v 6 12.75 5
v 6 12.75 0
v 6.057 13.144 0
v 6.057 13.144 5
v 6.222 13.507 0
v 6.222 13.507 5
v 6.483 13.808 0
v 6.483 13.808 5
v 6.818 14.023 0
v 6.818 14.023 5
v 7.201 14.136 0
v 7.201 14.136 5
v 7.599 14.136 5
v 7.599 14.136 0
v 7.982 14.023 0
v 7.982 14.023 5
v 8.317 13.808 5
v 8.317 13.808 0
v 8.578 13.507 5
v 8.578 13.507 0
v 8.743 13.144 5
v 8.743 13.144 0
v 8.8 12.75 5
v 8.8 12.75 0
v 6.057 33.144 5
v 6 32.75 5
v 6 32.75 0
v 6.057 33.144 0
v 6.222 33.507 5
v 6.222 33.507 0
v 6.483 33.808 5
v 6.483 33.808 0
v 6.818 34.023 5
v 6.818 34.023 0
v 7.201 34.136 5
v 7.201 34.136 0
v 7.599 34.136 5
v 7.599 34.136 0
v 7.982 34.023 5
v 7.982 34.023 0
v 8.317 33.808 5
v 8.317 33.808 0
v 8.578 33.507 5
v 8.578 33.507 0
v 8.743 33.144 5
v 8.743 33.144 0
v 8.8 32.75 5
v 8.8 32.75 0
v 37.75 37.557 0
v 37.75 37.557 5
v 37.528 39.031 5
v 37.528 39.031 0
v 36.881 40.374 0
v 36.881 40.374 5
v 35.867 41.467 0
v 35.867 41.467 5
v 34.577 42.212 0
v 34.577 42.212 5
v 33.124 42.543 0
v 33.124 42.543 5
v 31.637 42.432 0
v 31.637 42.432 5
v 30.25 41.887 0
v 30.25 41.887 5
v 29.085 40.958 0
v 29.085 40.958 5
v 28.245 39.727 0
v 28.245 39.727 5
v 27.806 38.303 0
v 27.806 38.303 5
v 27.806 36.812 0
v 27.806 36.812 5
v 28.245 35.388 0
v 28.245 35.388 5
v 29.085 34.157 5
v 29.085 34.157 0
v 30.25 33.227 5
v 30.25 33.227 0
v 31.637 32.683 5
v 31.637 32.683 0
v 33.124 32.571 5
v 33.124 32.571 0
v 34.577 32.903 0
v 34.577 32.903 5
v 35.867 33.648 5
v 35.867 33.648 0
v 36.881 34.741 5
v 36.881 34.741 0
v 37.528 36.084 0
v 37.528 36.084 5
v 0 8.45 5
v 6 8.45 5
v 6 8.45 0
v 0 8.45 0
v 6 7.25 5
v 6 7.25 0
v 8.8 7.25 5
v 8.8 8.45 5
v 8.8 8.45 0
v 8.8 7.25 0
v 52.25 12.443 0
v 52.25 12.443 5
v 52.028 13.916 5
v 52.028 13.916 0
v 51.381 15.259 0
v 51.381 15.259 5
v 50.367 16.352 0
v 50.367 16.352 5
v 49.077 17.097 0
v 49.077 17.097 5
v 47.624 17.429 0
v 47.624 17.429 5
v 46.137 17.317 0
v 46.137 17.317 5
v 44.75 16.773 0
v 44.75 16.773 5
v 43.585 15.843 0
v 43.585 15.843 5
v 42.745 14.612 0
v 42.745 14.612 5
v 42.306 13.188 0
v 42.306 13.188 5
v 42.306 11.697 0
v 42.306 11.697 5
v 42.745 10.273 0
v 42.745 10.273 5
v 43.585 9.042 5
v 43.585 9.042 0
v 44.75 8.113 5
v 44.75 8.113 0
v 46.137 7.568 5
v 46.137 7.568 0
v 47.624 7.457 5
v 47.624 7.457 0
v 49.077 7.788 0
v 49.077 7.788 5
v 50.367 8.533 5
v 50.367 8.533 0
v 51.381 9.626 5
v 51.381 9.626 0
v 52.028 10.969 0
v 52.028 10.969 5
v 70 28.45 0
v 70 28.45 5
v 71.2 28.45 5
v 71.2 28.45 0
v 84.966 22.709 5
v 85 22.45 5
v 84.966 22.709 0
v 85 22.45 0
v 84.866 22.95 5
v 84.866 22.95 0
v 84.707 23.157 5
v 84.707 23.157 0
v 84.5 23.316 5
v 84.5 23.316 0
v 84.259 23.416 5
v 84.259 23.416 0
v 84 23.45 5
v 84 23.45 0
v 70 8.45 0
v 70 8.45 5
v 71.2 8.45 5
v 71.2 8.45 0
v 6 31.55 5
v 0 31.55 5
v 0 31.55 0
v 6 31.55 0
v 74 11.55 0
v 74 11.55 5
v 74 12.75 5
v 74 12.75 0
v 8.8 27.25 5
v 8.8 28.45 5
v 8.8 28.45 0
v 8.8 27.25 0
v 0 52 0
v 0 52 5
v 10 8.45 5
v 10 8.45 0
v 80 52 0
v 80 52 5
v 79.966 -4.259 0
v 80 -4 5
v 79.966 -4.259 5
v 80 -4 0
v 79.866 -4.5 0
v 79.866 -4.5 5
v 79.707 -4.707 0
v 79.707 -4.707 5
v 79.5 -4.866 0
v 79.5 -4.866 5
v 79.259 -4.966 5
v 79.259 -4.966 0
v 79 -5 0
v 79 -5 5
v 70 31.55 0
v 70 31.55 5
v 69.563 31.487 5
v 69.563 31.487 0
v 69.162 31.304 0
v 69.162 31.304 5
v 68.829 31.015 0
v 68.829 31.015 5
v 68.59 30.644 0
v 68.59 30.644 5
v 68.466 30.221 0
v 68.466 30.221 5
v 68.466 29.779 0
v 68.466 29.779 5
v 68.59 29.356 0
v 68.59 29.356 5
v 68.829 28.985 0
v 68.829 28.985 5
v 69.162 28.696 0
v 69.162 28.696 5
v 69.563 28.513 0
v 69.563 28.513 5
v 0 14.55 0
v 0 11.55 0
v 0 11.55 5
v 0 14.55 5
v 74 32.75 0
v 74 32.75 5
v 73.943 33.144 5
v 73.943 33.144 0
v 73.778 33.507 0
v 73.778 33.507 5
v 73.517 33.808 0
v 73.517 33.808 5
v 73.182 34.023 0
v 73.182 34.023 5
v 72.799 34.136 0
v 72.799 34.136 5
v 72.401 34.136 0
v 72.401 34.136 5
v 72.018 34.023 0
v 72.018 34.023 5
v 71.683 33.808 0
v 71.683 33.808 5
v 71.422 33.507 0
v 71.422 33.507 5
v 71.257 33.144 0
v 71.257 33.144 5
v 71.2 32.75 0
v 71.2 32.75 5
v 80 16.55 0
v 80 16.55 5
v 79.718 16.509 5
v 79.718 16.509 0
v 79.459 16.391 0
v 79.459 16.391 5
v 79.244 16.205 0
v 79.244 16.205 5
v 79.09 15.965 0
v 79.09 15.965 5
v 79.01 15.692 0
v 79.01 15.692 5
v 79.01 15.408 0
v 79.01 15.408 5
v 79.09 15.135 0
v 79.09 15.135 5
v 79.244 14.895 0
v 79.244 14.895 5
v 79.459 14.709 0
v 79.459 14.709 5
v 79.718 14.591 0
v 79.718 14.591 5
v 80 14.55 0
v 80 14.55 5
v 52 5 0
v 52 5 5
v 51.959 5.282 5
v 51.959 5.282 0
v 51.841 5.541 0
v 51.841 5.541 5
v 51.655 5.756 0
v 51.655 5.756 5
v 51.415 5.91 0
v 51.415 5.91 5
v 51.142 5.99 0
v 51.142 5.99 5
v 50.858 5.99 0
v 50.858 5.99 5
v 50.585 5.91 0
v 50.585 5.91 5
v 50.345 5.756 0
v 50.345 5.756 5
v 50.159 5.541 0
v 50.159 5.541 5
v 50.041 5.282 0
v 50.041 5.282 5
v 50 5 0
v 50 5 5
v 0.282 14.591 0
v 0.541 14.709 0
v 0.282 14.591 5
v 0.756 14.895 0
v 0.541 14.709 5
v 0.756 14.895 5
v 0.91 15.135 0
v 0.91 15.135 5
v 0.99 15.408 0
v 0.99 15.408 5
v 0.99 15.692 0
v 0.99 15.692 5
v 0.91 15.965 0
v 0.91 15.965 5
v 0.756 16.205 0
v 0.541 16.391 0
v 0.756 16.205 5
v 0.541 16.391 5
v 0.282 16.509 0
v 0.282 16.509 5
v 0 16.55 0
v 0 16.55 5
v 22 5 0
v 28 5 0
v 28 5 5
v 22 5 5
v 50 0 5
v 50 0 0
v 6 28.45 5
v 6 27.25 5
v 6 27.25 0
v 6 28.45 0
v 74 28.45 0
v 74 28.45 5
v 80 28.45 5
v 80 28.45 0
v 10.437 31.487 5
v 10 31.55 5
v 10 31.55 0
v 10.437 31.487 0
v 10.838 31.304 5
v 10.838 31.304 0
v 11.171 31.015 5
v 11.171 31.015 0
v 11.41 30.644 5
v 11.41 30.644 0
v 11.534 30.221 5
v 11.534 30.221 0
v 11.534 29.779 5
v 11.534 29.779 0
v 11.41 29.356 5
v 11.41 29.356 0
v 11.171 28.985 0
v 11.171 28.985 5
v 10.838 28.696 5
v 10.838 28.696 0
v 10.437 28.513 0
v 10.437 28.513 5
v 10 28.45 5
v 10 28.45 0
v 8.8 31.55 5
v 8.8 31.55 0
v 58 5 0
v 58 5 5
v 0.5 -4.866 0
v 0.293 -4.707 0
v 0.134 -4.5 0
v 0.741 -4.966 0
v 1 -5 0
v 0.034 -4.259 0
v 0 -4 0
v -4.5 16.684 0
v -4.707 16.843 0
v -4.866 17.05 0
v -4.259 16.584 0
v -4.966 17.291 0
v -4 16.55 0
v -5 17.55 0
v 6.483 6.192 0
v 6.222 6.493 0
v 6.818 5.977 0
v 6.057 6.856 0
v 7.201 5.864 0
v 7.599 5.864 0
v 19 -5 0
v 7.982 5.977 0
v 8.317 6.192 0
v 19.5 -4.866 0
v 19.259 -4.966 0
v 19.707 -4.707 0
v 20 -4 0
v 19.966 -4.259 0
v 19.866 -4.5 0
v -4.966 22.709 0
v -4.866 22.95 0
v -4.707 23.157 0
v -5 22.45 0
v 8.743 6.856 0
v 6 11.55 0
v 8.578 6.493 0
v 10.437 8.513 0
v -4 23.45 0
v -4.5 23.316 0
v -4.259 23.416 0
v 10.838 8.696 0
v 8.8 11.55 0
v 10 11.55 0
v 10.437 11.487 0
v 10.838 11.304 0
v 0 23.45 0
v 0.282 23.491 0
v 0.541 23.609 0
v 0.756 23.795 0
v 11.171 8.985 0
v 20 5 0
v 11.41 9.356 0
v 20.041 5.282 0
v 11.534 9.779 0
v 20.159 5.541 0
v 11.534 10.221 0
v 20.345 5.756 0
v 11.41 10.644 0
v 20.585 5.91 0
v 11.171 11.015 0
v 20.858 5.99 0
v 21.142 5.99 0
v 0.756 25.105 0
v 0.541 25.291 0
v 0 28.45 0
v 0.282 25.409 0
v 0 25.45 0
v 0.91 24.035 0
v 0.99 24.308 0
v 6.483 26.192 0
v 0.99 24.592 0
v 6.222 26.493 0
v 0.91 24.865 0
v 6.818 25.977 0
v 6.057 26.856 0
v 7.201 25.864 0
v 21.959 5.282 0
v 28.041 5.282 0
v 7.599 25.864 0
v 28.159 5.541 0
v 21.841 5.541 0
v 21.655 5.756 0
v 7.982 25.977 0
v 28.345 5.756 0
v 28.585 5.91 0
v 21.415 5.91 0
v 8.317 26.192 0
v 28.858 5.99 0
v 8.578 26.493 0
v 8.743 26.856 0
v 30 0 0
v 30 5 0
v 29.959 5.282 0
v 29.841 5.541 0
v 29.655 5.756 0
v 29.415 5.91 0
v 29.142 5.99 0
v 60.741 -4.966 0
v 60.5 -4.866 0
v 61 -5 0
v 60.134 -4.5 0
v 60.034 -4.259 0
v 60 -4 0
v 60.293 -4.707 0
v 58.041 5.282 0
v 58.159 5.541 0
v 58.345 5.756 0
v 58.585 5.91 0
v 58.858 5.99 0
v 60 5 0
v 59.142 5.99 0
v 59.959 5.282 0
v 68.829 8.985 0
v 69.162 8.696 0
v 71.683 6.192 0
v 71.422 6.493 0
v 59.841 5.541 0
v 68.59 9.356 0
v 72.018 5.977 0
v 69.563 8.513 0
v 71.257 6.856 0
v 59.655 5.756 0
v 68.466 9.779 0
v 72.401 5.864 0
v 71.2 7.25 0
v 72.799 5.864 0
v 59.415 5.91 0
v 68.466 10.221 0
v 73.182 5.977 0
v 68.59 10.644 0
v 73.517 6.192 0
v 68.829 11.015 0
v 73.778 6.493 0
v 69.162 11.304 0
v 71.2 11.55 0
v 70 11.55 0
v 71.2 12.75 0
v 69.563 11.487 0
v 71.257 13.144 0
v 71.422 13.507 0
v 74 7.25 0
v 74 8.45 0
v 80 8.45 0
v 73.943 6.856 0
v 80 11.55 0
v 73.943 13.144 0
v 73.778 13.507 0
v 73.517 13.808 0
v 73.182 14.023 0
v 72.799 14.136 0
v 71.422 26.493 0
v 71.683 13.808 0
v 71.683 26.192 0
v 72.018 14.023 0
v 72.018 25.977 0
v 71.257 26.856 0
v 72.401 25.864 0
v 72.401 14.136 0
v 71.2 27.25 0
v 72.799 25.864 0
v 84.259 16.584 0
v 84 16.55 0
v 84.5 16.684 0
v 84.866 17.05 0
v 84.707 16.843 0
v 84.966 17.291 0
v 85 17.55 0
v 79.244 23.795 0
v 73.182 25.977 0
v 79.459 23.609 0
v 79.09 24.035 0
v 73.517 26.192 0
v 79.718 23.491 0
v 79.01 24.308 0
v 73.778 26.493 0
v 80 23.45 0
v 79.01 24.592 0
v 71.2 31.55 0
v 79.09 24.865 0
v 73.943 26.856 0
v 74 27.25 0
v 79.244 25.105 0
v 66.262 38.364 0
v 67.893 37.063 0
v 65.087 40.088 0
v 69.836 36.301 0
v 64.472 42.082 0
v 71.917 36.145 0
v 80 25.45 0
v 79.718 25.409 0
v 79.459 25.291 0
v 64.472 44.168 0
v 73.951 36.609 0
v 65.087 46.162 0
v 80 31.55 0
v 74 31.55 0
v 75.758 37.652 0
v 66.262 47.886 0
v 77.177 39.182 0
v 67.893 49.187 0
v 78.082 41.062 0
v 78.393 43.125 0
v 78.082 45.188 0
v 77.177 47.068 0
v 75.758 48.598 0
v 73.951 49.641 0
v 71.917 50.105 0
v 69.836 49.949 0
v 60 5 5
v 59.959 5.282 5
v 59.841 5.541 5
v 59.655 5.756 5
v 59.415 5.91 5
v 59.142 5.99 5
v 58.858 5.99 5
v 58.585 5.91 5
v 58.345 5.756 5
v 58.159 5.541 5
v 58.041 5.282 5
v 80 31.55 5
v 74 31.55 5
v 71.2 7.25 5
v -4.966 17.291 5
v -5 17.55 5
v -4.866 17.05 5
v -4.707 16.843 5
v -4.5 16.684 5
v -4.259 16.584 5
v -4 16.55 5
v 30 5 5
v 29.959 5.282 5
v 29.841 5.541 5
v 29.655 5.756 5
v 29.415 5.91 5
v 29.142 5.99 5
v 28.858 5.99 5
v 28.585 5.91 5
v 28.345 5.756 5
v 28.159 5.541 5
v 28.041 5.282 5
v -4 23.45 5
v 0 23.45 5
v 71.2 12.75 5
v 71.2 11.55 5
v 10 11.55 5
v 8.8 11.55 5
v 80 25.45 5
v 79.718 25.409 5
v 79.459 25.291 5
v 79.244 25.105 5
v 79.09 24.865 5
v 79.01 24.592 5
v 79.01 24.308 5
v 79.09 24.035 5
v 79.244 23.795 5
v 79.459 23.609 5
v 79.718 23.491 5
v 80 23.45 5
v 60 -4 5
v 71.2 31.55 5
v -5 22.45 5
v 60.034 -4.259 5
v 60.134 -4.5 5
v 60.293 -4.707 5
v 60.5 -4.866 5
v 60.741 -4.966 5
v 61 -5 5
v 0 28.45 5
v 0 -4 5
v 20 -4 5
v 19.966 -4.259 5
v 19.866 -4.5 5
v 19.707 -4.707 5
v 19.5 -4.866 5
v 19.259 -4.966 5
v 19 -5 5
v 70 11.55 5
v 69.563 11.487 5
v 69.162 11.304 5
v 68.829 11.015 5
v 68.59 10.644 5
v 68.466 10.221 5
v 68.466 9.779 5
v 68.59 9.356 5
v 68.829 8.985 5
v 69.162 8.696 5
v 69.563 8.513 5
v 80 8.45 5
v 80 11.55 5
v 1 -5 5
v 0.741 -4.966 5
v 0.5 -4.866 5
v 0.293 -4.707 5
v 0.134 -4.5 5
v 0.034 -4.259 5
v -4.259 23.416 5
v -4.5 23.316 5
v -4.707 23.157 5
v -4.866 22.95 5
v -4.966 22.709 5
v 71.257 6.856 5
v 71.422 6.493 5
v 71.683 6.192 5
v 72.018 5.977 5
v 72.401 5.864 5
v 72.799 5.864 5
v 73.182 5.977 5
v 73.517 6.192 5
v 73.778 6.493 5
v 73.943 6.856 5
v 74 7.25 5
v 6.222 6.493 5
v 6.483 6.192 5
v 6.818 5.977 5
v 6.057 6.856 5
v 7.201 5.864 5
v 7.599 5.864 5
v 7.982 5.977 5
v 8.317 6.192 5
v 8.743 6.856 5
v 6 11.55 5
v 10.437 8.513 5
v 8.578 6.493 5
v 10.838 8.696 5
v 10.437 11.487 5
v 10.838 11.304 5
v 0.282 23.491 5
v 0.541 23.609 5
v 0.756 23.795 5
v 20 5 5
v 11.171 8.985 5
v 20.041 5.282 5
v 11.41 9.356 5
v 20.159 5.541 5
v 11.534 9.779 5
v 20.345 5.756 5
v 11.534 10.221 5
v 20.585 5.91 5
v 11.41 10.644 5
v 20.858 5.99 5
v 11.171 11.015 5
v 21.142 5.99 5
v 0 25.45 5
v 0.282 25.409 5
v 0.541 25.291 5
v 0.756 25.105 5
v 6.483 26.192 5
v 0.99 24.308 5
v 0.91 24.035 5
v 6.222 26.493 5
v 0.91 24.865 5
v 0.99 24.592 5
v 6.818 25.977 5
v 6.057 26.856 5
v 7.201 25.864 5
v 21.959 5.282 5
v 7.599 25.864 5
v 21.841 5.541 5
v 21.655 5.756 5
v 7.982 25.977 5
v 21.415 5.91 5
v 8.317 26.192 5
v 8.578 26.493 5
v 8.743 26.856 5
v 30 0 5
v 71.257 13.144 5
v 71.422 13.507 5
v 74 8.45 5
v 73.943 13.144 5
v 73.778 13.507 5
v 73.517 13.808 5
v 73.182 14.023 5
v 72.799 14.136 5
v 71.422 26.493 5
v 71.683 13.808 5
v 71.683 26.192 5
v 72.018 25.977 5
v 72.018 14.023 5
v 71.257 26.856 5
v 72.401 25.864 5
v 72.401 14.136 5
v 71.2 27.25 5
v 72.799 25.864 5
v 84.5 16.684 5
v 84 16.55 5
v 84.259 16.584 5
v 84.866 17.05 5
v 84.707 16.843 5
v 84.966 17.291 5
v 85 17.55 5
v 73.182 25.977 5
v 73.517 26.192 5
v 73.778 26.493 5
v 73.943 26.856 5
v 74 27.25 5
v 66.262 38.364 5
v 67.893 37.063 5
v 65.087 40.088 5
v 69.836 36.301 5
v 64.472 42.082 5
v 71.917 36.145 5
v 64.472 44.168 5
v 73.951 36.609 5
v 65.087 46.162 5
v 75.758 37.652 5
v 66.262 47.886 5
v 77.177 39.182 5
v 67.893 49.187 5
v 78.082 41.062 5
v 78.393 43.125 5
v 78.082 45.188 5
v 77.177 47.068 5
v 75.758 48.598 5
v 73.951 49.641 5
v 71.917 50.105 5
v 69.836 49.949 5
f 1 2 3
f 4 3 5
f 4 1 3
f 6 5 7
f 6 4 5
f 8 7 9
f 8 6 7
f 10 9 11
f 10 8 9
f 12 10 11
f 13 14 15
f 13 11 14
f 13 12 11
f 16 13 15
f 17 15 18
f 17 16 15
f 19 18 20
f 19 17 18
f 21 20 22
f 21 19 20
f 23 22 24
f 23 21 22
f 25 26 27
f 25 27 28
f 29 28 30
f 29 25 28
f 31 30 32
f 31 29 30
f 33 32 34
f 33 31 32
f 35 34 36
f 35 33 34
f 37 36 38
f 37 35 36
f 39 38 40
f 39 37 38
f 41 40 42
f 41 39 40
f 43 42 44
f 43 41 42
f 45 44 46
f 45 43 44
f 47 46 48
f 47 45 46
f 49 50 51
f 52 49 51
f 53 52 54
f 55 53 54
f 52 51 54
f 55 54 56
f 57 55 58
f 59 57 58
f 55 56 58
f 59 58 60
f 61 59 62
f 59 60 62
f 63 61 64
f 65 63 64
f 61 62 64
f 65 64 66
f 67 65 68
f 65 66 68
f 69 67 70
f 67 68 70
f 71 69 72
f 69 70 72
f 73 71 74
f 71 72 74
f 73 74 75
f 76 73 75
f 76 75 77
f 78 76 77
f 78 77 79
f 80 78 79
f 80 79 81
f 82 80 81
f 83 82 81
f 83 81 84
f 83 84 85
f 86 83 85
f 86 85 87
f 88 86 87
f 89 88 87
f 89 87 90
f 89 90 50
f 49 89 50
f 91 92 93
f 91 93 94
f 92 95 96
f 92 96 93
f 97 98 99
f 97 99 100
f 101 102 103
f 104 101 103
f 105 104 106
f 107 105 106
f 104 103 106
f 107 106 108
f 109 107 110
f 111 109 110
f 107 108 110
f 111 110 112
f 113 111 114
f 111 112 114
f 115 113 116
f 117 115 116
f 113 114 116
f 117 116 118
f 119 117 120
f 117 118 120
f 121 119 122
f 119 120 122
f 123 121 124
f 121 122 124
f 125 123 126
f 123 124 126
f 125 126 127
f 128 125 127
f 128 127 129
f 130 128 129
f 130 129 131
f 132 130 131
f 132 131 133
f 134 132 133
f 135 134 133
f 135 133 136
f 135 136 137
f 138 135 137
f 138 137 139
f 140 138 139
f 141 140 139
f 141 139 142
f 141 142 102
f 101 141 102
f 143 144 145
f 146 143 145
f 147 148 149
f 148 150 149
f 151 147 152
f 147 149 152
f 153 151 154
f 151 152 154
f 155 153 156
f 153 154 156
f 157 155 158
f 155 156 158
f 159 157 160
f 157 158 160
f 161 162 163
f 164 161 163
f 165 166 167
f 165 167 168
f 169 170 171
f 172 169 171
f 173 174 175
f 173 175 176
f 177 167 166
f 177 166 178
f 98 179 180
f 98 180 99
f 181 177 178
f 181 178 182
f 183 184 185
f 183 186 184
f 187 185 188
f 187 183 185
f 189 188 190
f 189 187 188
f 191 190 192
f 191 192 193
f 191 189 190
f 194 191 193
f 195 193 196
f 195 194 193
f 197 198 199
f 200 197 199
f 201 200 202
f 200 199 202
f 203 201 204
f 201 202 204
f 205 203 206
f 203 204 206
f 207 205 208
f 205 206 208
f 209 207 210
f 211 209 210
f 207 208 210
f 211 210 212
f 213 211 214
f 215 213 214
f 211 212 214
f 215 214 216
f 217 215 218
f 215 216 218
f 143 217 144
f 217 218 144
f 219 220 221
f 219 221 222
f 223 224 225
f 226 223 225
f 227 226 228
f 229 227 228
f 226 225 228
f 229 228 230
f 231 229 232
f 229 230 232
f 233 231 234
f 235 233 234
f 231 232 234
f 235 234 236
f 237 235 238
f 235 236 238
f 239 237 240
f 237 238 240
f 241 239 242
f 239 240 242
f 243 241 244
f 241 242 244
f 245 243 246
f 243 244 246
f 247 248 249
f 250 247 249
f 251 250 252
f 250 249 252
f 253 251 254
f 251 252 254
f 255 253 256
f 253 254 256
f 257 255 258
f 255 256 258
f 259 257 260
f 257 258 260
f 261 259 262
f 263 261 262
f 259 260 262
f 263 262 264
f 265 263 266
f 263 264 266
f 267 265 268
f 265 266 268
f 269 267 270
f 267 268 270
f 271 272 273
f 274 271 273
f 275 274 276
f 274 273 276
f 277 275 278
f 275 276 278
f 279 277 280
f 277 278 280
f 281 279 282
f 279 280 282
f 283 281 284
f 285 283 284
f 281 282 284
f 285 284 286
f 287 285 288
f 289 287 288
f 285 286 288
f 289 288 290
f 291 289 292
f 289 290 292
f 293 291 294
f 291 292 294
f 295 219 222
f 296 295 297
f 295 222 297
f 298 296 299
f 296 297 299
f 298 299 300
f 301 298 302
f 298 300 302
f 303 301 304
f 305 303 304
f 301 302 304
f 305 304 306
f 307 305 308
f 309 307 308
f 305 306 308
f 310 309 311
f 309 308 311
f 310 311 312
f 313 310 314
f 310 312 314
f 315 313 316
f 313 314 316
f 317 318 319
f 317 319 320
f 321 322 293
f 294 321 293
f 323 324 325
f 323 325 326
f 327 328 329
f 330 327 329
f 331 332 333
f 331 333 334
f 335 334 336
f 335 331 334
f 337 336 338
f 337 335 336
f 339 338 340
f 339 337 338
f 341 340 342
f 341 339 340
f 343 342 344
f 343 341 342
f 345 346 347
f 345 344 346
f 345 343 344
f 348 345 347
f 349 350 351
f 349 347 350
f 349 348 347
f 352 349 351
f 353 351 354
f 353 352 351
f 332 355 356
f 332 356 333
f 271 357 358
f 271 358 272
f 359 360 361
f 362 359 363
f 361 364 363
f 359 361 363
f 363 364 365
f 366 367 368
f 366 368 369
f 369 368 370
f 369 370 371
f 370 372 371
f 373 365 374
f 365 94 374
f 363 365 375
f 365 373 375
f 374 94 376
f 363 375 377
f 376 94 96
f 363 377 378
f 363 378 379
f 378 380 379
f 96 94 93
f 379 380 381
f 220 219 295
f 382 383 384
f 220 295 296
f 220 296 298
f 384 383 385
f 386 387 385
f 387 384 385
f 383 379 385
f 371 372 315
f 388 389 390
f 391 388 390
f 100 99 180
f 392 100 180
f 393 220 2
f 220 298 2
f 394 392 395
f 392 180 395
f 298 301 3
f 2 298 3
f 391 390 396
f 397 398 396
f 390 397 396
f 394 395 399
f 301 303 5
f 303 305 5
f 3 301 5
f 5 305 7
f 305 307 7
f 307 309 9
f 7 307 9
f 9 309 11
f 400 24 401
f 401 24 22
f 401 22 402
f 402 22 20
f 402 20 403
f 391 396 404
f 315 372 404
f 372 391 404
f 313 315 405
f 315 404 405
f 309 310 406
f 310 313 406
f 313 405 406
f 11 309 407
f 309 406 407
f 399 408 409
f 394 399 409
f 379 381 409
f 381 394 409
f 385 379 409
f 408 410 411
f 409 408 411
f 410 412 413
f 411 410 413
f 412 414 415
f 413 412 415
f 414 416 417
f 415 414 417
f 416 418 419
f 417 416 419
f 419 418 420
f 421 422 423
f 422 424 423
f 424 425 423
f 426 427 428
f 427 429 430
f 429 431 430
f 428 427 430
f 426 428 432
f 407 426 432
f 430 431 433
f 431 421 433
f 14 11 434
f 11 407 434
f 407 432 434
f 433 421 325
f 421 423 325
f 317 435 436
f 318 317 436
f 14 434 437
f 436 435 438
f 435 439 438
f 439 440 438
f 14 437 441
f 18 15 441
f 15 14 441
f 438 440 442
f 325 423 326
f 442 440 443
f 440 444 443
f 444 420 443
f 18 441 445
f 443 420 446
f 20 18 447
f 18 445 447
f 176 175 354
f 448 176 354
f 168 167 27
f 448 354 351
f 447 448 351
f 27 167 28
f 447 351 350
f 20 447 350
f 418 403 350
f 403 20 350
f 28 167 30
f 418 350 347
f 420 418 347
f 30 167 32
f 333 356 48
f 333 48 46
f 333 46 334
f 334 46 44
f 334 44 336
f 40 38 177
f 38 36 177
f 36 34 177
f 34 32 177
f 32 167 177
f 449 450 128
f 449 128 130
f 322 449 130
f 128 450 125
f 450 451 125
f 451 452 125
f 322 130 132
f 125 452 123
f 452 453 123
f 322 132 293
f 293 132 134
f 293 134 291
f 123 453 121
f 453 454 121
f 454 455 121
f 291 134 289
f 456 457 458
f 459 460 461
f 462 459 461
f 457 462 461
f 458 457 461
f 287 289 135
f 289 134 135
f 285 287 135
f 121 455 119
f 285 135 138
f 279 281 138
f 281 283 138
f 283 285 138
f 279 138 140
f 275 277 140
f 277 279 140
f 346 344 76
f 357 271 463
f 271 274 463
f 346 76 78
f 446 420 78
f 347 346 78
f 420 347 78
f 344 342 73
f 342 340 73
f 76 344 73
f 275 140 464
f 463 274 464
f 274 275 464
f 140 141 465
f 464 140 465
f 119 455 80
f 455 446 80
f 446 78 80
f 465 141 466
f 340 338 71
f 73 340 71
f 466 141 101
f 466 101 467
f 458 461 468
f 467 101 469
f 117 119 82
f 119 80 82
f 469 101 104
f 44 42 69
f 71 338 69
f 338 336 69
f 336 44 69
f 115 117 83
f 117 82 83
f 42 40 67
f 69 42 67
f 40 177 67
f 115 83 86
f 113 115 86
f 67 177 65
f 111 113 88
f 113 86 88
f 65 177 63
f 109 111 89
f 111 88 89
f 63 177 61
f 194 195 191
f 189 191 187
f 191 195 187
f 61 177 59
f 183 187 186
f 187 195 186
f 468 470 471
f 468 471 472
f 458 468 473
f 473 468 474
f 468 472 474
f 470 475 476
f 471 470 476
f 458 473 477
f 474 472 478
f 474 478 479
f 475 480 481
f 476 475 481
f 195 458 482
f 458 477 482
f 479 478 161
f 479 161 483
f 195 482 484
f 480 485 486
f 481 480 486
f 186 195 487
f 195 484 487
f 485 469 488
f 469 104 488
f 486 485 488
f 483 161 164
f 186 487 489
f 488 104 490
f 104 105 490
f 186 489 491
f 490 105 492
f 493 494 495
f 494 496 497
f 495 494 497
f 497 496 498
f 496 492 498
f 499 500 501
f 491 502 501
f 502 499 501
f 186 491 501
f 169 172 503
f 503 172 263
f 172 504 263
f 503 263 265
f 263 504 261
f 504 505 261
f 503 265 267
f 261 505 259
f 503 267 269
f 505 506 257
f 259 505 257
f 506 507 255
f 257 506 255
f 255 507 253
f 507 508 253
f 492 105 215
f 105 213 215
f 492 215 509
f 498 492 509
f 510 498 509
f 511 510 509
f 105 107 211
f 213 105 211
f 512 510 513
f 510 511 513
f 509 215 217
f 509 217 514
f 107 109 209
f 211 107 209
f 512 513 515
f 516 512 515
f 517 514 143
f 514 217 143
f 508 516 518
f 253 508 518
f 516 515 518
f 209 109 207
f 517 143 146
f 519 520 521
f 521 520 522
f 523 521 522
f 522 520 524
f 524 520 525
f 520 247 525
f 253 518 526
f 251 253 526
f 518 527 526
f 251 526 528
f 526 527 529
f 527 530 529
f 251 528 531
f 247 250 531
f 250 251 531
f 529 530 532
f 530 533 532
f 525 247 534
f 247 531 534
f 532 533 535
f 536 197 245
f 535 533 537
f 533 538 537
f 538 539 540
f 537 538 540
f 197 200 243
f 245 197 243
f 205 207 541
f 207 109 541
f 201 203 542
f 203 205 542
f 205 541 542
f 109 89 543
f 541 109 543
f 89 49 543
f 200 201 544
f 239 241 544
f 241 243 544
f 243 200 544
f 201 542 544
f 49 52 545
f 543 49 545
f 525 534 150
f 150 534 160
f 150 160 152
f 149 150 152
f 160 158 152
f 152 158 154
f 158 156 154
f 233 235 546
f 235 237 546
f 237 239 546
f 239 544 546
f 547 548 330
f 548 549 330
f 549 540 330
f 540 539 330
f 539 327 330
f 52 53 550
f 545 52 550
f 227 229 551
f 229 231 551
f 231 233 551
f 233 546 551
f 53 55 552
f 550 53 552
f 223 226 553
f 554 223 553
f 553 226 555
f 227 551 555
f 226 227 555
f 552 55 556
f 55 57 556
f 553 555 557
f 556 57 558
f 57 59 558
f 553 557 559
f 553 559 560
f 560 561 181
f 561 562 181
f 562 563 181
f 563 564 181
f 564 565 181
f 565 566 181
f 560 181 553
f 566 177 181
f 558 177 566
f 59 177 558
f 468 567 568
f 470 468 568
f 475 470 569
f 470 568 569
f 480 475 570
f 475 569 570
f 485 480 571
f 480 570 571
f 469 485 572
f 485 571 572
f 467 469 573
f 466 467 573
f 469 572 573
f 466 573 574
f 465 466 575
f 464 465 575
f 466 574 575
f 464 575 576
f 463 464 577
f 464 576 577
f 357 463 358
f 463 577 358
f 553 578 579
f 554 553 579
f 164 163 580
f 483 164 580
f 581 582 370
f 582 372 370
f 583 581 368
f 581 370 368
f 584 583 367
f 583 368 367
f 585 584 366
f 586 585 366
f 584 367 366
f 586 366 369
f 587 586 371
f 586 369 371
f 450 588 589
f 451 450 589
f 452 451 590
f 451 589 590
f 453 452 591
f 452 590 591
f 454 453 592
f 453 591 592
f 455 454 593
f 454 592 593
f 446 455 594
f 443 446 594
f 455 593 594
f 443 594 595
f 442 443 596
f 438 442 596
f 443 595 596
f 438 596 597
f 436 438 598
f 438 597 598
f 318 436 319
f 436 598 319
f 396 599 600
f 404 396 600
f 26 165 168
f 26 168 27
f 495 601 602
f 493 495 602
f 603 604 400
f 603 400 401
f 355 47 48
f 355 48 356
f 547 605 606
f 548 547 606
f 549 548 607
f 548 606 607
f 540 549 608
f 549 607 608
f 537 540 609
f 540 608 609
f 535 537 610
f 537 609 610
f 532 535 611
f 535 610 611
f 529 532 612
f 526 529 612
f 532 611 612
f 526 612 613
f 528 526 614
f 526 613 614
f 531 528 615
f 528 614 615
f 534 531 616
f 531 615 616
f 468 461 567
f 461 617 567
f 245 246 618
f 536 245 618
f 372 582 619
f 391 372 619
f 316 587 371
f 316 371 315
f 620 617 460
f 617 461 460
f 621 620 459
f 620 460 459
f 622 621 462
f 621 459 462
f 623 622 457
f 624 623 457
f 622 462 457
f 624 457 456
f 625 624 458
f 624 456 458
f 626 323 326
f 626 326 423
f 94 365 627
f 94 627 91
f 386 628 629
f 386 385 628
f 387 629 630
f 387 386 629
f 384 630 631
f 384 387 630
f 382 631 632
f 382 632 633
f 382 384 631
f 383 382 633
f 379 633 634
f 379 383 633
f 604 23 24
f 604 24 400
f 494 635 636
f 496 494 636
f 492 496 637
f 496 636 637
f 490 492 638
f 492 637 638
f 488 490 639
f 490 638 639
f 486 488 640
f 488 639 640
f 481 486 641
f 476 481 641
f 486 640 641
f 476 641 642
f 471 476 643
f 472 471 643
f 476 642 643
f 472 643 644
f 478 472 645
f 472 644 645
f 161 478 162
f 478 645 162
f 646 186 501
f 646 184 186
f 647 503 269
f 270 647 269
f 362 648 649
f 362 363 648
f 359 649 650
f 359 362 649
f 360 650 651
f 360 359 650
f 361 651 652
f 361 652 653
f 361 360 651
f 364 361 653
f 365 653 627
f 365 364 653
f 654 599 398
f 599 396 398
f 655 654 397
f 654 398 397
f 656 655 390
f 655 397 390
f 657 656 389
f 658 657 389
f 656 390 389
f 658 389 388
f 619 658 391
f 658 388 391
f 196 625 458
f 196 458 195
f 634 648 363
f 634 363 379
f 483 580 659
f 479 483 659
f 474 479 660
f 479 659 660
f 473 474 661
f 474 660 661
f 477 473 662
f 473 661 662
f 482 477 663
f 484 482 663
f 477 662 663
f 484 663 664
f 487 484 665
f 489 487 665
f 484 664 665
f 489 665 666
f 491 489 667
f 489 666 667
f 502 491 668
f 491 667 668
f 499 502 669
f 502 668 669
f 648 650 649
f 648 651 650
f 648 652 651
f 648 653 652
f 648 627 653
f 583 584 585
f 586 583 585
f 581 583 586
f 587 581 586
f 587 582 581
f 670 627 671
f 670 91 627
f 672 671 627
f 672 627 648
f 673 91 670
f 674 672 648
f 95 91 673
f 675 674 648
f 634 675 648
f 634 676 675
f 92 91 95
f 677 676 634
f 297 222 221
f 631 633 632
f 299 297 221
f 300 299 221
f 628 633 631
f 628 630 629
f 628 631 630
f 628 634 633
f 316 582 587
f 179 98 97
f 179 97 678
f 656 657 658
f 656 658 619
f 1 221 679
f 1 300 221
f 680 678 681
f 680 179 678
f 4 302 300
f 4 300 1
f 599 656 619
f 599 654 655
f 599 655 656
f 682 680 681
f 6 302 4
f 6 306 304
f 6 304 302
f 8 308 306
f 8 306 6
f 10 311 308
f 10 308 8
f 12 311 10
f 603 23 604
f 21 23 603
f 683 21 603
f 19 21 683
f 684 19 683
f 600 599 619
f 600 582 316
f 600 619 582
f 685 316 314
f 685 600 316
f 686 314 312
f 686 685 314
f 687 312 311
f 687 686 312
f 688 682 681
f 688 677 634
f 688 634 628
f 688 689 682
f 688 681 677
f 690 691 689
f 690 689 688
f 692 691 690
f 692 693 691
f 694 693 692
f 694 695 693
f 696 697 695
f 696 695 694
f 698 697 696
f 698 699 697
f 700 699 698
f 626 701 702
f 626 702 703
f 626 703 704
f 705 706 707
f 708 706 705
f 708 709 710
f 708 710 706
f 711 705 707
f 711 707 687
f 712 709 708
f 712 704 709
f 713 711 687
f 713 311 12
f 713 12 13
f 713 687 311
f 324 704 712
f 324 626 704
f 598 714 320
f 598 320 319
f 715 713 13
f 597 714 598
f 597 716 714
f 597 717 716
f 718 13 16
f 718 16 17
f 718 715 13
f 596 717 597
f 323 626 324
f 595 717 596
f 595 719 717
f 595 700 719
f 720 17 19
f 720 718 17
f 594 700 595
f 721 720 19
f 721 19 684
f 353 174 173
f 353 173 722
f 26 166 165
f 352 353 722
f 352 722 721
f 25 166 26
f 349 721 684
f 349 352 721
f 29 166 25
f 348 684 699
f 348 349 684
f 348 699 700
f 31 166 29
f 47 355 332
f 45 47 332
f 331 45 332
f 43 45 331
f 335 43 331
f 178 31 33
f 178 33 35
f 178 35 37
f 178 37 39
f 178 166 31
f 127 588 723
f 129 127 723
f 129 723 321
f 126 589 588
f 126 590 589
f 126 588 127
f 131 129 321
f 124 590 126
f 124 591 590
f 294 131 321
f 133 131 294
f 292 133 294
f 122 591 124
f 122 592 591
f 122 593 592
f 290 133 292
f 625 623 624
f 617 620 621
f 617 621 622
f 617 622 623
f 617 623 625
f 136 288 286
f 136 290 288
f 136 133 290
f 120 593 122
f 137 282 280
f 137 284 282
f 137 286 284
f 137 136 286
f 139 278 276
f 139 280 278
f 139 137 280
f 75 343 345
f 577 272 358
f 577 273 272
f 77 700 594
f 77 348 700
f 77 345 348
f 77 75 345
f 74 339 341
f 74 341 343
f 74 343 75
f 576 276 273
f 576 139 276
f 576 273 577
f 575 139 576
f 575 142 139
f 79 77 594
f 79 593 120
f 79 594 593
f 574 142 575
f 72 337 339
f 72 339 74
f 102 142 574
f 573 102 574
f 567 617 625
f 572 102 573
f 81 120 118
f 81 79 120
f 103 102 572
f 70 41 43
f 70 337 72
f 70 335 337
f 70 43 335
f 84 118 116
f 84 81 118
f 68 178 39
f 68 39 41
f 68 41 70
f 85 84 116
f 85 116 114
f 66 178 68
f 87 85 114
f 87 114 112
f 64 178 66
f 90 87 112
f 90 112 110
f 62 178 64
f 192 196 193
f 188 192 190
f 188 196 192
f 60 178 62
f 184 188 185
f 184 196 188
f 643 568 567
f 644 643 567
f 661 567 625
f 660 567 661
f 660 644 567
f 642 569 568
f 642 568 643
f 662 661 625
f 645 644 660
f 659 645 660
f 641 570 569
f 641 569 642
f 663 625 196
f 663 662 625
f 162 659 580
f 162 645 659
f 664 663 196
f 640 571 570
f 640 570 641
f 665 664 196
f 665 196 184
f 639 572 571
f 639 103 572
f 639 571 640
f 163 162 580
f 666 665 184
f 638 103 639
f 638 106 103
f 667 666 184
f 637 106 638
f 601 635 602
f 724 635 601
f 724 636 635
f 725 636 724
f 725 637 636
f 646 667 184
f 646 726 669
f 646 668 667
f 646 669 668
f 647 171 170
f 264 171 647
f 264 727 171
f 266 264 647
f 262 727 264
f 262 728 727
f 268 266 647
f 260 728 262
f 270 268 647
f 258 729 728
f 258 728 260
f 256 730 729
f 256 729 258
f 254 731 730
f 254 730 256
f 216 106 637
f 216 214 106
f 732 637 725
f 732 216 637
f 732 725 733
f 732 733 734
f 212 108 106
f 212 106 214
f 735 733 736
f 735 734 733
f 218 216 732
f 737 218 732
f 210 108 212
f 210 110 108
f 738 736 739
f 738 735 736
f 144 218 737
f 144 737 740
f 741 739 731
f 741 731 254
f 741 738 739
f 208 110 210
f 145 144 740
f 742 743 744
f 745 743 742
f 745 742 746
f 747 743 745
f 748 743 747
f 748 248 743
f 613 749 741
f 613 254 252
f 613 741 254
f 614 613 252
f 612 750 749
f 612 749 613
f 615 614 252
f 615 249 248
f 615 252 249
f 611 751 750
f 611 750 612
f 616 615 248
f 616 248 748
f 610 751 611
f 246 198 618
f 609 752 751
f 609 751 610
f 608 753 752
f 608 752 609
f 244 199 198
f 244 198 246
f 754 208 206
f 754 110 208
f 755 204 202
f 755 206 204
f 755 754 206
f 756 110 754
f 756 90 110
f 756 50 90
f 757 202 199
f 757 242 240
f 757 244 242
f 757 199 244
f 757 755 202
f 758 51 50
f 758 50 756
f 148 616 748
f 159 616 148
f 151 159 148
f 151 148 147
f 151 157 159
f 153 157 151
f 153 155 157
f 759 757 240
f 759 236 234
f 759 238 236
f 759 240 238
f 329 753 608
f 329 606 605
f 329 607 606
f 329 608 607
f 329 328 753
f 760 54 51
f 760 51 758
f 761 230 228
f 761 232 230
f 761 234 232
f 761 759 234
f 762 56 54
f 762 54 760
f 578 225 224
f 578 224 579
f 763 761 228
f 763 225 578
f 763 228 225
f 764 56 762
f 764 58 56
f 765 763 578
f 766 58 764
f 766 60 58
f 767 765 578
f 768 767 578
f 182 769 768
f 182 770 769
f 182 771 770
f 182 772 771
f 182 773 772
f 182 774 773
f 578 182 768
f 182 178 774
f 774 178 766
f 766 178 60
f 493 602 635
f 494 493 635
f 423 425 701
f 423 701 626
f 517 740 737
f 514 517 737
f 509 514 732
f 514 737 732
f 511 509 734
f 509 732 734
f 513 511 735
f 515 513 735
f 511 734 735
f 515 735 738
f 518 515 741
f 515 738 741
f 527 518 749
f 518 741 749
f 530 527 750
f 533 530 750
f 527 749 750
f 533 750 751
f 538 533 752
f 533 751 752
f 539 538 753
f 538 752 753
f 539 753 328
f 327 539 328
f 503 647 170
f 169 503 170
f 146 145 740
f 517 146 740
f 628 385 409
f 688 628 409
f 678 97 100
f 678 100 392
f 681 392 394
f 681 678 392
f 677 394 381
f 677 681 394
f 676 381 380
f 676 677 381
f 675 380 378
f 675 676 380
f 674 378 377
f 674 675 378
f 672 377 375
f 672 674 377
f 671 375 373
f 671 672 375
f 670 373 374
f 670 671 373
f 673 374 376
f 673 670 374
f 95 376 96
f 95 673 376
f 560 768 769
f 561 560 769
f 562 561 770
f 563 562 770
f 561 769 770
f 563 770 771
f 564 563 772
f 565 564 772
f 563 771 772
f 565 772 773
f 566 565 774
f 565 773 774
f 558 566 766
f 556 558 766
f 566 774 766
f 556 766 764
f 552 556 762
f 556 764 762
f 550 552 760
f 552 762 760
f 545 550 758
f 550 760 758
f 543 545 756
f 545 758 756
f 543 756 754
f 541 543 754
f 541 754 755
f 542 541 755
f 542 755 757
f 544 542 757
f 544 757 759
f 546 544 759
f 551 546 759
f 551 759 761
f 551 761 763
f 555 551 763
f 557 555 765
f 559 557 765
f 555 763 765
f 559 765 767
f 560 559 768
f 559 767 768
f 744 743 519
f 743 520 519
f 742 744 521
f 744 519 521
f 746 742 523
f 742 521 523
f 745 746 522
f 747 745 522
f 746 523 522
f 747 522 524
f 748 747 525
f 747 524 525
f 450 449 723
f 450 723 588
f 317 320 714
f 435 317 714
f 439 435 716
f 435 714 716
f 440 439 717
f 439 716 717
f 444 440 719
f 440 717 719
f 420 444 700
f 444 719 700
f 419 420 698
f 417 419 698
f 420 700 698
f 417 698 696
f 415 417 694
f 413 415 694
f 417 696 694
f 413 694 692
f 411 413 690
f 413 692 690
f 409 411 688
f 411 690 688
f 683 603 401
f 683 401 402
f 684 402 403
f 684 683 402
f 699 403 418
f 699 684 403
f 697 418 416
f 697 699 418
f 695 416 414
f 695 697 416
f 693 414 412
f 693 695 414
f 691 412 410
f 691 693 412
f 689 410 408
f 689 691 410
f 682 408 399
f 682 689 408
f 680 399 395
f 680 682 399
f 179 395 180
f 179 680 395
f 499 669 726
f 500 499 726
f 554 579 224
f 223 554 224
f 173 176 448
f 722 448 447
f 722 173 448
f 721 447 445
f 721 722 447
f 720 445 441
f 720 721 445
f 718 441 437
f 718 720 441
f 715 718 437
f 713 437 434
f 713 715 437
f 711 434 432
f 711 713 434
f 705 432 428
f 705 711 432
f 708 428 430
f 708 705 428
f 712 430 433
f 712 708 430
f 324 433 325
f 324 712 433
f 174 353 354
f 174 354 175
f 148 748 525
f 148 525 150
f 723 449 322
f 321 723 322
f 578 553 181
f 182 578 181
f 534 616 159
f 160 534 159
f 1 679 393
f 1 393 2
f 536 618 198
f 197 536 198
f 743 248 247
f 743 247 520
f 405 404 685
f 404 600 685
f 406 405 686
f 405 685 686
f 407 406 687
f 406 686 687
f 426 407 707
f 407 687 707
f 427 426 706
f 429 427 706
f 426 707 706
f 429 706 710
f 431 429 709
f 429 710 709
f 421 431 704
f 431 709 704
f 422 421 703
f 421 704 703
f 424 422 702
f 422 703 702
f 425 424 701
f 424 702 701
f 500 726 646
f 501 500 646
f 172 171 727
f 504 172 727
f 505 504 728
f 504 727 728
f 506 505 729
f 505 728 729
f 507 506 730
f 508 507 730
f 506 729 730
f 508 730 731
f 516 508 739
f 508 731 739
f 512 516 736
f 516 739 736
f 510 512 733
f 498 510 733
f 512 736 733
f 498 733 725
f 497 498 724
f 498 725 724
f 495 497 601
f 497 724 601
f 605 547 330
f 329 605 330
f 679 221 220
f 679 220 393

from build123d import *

# Parameters (mm, degrees)
SKETCH_1_W          = 80
SKETCH_1_H          = 52
EXTRUDE_1_DEPTH     = 5
SKETCH_2_R          = 7
CUT_EXTRUDE_1_DEPTH = 5
CUT_EXTRUDE_3_DEPTH = 10
SKETCH_7_R          = 5
CUT_EXTRUDE_4_DEPTH = 10
SKETCH_10_W         = 10
SKETCH_10_H         = 5
CUT_EXTRUDE_5_DEPTH = 10
SKETCH_11_R         = 1
CUT_EXTRUDE_6_DEPTH = 10
SKETCH_12_W         = 5
SKETCH_12_H         = 6.9
EXTRUDE_3_DEPTH     = 5
SKETCH_13_R         = 1
CUT_EXTRUDE_7_DEPTH = 5
FILLET_1_R          = 1
SKETCH_14_W         = 20
SKETCH_14_H         = 5
EXTRUDE_4_DEPTH     = 5
FILLET_2_R          = 1


with BuildPart() as part:
    # 스케치1 → 보스-돌출1 (new body)
    with BuildSketch(Plane.XY):
        with Locations((40, 26)):
            Rectangle(SKETCH_1_W, SKETCH_1_H)
    extrude(amount=EXTRUDE_1_DEPTH)

    # 스케치2 → 컷-돌출1 (cut)
    with BuildSketch(Plane.XY.offset(5)):
        with Locations((71.393420887, 43.125)):
            Circle(SKETCH_2_R)
    extrude(amount=-CUT_EXTRUDE_1_DEPTH, mode=Mode.SUBTRACT)

    # 스케치6 → 컷-돌출3 (cut)
    with BuildSketch(Plane.XY.offset(5)):
        with BuildLine():
            Line((0, 31.55), (6, 31.55))
            Line((6, 31.55), (6, 32.75))
            ThreePointArc((6, 32.75), (7.4, 34.15), (8.8, 32.75))
            Line((8.8, 32.75), (8.8, 31.55))
            Line((8.8, 31.55), (10, 31.55))
            ThreePointArc((10, 31.55), (11.55, 30), (10, 28.45))
            Line((10, 28.45), (8.8, 28.45))
            Line((8.8, 28.45), (8.8, 27.25))
            ThreePointArc((8.8, 27.25), (7.4, 25.85), (6, 27.25))
            Line((6, 27.25), (6, 28.45))
            Line((6, 28.45), (0, 28.45))
            Line((0, 28.45), (0, 31.55))
        make_face()
        with BuildLine():
            Line((0, 11.55), (6, 11.55))
            Line((6, 11.55), (6, 12.75))
            ThreePointArc((6, 12.75), (7.4, 14.15), (8.8, 12.75))
            Line((8.8, 12.75), (8.8, 11.55))
            Line((8.8, 11.55), (10, 11.55))
            ThreePointArc((10, 11.55), (11.55, 10), (10, 8.45))
            Line((10, 8.45), (8.8, 8.45))
            Line((8.8, 8.45), (8.8, 7.25))
            ThreePointArc((8.8, 7.25), (7.4, 5.85), (6, 7.25))
            Line((6, 7.25), (6, 8.45))
            Line((6, 8.45), (0, 8.45))
            Line((0, 8.45), (0, 11.55))
        make_face()
        with BuildLine():
            Line((74, 7.25), (74, 8.45))
            Line((74, 8.45), (80, 8.45))
            Line((80, 8.45), (80, 11.55))
            Line((80, 11.55), (74, 11.55))
            Line((74, 11.55), (74, 12.75))
            ThreePointArc((74, 12.75), (72.6, 14.15), (71.2, 12.75))
            Line((71.2, 12.75), (71.2, 11.55))
            Line((71.2, 11.55), (70, 11.55))
            ThreePointArc((70, 11.55), (68.45, 10), (70, 8.45))
            Line((70, 8.45), (71.2, 8.45))
            Line((71.2, 8.45), (71.2, 7.25))
            ThreePointArc((71.2, 7.25), (72.6, 5.85), (74, 7.25))
        make_face()
        with BuildLine():
            Line((74, 27.25), (74, 28.45))
            Line((74, 28.45), (80, 28.45))
            Line((80, 28.45), (80, 31.55))
            Line((80, 31.55), (74, 31.55))
            Line((74, 31.55), (74, 32.75))
            ThreePointArc((74, 32.75), (72.6, 34.15), (71.2, 32.75))
            Line((71.2, 32.75), (71.2, 31.55))
            Line((71.2, 31.55), (70, 31.55))
            ThreePointArc((70, 31.55), (68.45, 30), (70, 28.45))
            Line((70, 28.45), (71.2, 28.45))
            Line((71.2, 28.45), (71.2, 27.25))
            ThreePointArc((71.2, 27.25), (72.6, 25.85), (74, 27.25))
        make_face()
    extrude(amount=-CUT_EXTRUDE_3_DEPTH, mode=Mode.SUBTRACT)

    # 스케치7 → 컷-돌출4 (cut)
    with BuildSketch(Plane.XY.offset(5)):
        with Locations((32.75, 37.557368355)):
            Circle(SKETCH_7_R)
        with Locations((47.25, 12.442631645)):
            Circle(SKETCH_7_R)
    extrude(amount=-CUT_EXTRUDE_4_DEPTH, mode=Mode.SUBTRACT)

    # 스케치10 → 컷-돌출5 (cut)
    with BuildSketch(Plane(origin=(0, 0, 0), x_dir=(-1, 0, 0), z_dir=(0, 0, -1))):
        with Locations((-25, 2.5)):
            Rectangle(SKETCH_10_W, SKETCH_10_H)
        with Locations((-55, 2.5)):
            Rectangle(SKETCH_10_W, SKETCH_10_H)
    extrude(amount=-CUT_EXTRUDE_5_DEPTH, mode=Mode.SUBTRACT)

    # 스케치11 → 컷-돌출6 (cut)
    with BuildSketch(Plane.XY.offset(5)):
        with Locations((59, 5)):
            Circle(SKETCH_11_R)
        with Locations((51, 5)):
            Circle(SKETCH_11_R)
        with Locations((29, 5)):
            Circle(SKETCH_11_R)
        with Locations((21, 5)):
            Circle(SKETCH_11_R)
    extrude(amount=-CUT_EXTRUDE_6_DEPTH, mode=Mode.SUBTRACT)

    # 스케치12 → 보스-돌출3 (add)
    with BuildSketch(Plane.XY.offset(5)):
        with Locations((82.5, 20)):
            Rectangle(SKETCH_12_W, SKETCH_12_H)
        with Locations((-2.5, 20)):
            Rectangle(SKETCH_12_W, SKETCH_12_H)
    extrude(amount=-EXTRUDE_3_DEPTH)

    # 스케치13 → 컷-돌출7 (cut)
    with BuildSketch(Plane.XY.offset(5)):
        with Locations((80, 24.45)):
            Circle(SKETCH_13_R)
        with Locations((80, 15.55)):
            Circle(SKETCH_13_R)
        with Locations((0, 15.55)):
            Circle(SKETCH_13_R)
        with Locations((0, 24.45)):
            Circle(SKETCH_13_R)
    extrude(amount=-CUT_EXTRUDE_7_DEPTH, mode=Mode.SUBTRACT)

    # 필렛1
    fillet_1_edges = [part.edges().sort_by_distance(p)[0] for p in [
        (85, 23.45, 2.5),
        (85, 16.55, 2.5),
        (-5, 16.55, 2.5),
        (-5, 23.45, 2.5),
    ]]
    fillet(fillet_1_edges, radius=FILLET_1_R)

    # 스케치14 → 보스-돌출4 (add)
    with BuildSketch(Plane.XY.offset(5)):
        with Locations((70, -2.5)):
            Rectangle(SKETCH_14_W, SKETCH_14_H)
        with Locations((10, -2.5)):
            Rectangle(SKETCH_14_W, SKETCH_14_H)
    extrude(amount=-EXTRUDE_4_DEPTH)

    # 필렛2
    fillet_2_edges = [part.edges().sort_by_distance(p)[0] for p in [
        (80, -5, 2.5),
        (60, -5, 2.5),
        (0, -5, 2.5),
        (20, -5, 2.5),
    ]]
    fillet(fillet_2_edges, radius=FILLET_2_R)


solid = part.part
